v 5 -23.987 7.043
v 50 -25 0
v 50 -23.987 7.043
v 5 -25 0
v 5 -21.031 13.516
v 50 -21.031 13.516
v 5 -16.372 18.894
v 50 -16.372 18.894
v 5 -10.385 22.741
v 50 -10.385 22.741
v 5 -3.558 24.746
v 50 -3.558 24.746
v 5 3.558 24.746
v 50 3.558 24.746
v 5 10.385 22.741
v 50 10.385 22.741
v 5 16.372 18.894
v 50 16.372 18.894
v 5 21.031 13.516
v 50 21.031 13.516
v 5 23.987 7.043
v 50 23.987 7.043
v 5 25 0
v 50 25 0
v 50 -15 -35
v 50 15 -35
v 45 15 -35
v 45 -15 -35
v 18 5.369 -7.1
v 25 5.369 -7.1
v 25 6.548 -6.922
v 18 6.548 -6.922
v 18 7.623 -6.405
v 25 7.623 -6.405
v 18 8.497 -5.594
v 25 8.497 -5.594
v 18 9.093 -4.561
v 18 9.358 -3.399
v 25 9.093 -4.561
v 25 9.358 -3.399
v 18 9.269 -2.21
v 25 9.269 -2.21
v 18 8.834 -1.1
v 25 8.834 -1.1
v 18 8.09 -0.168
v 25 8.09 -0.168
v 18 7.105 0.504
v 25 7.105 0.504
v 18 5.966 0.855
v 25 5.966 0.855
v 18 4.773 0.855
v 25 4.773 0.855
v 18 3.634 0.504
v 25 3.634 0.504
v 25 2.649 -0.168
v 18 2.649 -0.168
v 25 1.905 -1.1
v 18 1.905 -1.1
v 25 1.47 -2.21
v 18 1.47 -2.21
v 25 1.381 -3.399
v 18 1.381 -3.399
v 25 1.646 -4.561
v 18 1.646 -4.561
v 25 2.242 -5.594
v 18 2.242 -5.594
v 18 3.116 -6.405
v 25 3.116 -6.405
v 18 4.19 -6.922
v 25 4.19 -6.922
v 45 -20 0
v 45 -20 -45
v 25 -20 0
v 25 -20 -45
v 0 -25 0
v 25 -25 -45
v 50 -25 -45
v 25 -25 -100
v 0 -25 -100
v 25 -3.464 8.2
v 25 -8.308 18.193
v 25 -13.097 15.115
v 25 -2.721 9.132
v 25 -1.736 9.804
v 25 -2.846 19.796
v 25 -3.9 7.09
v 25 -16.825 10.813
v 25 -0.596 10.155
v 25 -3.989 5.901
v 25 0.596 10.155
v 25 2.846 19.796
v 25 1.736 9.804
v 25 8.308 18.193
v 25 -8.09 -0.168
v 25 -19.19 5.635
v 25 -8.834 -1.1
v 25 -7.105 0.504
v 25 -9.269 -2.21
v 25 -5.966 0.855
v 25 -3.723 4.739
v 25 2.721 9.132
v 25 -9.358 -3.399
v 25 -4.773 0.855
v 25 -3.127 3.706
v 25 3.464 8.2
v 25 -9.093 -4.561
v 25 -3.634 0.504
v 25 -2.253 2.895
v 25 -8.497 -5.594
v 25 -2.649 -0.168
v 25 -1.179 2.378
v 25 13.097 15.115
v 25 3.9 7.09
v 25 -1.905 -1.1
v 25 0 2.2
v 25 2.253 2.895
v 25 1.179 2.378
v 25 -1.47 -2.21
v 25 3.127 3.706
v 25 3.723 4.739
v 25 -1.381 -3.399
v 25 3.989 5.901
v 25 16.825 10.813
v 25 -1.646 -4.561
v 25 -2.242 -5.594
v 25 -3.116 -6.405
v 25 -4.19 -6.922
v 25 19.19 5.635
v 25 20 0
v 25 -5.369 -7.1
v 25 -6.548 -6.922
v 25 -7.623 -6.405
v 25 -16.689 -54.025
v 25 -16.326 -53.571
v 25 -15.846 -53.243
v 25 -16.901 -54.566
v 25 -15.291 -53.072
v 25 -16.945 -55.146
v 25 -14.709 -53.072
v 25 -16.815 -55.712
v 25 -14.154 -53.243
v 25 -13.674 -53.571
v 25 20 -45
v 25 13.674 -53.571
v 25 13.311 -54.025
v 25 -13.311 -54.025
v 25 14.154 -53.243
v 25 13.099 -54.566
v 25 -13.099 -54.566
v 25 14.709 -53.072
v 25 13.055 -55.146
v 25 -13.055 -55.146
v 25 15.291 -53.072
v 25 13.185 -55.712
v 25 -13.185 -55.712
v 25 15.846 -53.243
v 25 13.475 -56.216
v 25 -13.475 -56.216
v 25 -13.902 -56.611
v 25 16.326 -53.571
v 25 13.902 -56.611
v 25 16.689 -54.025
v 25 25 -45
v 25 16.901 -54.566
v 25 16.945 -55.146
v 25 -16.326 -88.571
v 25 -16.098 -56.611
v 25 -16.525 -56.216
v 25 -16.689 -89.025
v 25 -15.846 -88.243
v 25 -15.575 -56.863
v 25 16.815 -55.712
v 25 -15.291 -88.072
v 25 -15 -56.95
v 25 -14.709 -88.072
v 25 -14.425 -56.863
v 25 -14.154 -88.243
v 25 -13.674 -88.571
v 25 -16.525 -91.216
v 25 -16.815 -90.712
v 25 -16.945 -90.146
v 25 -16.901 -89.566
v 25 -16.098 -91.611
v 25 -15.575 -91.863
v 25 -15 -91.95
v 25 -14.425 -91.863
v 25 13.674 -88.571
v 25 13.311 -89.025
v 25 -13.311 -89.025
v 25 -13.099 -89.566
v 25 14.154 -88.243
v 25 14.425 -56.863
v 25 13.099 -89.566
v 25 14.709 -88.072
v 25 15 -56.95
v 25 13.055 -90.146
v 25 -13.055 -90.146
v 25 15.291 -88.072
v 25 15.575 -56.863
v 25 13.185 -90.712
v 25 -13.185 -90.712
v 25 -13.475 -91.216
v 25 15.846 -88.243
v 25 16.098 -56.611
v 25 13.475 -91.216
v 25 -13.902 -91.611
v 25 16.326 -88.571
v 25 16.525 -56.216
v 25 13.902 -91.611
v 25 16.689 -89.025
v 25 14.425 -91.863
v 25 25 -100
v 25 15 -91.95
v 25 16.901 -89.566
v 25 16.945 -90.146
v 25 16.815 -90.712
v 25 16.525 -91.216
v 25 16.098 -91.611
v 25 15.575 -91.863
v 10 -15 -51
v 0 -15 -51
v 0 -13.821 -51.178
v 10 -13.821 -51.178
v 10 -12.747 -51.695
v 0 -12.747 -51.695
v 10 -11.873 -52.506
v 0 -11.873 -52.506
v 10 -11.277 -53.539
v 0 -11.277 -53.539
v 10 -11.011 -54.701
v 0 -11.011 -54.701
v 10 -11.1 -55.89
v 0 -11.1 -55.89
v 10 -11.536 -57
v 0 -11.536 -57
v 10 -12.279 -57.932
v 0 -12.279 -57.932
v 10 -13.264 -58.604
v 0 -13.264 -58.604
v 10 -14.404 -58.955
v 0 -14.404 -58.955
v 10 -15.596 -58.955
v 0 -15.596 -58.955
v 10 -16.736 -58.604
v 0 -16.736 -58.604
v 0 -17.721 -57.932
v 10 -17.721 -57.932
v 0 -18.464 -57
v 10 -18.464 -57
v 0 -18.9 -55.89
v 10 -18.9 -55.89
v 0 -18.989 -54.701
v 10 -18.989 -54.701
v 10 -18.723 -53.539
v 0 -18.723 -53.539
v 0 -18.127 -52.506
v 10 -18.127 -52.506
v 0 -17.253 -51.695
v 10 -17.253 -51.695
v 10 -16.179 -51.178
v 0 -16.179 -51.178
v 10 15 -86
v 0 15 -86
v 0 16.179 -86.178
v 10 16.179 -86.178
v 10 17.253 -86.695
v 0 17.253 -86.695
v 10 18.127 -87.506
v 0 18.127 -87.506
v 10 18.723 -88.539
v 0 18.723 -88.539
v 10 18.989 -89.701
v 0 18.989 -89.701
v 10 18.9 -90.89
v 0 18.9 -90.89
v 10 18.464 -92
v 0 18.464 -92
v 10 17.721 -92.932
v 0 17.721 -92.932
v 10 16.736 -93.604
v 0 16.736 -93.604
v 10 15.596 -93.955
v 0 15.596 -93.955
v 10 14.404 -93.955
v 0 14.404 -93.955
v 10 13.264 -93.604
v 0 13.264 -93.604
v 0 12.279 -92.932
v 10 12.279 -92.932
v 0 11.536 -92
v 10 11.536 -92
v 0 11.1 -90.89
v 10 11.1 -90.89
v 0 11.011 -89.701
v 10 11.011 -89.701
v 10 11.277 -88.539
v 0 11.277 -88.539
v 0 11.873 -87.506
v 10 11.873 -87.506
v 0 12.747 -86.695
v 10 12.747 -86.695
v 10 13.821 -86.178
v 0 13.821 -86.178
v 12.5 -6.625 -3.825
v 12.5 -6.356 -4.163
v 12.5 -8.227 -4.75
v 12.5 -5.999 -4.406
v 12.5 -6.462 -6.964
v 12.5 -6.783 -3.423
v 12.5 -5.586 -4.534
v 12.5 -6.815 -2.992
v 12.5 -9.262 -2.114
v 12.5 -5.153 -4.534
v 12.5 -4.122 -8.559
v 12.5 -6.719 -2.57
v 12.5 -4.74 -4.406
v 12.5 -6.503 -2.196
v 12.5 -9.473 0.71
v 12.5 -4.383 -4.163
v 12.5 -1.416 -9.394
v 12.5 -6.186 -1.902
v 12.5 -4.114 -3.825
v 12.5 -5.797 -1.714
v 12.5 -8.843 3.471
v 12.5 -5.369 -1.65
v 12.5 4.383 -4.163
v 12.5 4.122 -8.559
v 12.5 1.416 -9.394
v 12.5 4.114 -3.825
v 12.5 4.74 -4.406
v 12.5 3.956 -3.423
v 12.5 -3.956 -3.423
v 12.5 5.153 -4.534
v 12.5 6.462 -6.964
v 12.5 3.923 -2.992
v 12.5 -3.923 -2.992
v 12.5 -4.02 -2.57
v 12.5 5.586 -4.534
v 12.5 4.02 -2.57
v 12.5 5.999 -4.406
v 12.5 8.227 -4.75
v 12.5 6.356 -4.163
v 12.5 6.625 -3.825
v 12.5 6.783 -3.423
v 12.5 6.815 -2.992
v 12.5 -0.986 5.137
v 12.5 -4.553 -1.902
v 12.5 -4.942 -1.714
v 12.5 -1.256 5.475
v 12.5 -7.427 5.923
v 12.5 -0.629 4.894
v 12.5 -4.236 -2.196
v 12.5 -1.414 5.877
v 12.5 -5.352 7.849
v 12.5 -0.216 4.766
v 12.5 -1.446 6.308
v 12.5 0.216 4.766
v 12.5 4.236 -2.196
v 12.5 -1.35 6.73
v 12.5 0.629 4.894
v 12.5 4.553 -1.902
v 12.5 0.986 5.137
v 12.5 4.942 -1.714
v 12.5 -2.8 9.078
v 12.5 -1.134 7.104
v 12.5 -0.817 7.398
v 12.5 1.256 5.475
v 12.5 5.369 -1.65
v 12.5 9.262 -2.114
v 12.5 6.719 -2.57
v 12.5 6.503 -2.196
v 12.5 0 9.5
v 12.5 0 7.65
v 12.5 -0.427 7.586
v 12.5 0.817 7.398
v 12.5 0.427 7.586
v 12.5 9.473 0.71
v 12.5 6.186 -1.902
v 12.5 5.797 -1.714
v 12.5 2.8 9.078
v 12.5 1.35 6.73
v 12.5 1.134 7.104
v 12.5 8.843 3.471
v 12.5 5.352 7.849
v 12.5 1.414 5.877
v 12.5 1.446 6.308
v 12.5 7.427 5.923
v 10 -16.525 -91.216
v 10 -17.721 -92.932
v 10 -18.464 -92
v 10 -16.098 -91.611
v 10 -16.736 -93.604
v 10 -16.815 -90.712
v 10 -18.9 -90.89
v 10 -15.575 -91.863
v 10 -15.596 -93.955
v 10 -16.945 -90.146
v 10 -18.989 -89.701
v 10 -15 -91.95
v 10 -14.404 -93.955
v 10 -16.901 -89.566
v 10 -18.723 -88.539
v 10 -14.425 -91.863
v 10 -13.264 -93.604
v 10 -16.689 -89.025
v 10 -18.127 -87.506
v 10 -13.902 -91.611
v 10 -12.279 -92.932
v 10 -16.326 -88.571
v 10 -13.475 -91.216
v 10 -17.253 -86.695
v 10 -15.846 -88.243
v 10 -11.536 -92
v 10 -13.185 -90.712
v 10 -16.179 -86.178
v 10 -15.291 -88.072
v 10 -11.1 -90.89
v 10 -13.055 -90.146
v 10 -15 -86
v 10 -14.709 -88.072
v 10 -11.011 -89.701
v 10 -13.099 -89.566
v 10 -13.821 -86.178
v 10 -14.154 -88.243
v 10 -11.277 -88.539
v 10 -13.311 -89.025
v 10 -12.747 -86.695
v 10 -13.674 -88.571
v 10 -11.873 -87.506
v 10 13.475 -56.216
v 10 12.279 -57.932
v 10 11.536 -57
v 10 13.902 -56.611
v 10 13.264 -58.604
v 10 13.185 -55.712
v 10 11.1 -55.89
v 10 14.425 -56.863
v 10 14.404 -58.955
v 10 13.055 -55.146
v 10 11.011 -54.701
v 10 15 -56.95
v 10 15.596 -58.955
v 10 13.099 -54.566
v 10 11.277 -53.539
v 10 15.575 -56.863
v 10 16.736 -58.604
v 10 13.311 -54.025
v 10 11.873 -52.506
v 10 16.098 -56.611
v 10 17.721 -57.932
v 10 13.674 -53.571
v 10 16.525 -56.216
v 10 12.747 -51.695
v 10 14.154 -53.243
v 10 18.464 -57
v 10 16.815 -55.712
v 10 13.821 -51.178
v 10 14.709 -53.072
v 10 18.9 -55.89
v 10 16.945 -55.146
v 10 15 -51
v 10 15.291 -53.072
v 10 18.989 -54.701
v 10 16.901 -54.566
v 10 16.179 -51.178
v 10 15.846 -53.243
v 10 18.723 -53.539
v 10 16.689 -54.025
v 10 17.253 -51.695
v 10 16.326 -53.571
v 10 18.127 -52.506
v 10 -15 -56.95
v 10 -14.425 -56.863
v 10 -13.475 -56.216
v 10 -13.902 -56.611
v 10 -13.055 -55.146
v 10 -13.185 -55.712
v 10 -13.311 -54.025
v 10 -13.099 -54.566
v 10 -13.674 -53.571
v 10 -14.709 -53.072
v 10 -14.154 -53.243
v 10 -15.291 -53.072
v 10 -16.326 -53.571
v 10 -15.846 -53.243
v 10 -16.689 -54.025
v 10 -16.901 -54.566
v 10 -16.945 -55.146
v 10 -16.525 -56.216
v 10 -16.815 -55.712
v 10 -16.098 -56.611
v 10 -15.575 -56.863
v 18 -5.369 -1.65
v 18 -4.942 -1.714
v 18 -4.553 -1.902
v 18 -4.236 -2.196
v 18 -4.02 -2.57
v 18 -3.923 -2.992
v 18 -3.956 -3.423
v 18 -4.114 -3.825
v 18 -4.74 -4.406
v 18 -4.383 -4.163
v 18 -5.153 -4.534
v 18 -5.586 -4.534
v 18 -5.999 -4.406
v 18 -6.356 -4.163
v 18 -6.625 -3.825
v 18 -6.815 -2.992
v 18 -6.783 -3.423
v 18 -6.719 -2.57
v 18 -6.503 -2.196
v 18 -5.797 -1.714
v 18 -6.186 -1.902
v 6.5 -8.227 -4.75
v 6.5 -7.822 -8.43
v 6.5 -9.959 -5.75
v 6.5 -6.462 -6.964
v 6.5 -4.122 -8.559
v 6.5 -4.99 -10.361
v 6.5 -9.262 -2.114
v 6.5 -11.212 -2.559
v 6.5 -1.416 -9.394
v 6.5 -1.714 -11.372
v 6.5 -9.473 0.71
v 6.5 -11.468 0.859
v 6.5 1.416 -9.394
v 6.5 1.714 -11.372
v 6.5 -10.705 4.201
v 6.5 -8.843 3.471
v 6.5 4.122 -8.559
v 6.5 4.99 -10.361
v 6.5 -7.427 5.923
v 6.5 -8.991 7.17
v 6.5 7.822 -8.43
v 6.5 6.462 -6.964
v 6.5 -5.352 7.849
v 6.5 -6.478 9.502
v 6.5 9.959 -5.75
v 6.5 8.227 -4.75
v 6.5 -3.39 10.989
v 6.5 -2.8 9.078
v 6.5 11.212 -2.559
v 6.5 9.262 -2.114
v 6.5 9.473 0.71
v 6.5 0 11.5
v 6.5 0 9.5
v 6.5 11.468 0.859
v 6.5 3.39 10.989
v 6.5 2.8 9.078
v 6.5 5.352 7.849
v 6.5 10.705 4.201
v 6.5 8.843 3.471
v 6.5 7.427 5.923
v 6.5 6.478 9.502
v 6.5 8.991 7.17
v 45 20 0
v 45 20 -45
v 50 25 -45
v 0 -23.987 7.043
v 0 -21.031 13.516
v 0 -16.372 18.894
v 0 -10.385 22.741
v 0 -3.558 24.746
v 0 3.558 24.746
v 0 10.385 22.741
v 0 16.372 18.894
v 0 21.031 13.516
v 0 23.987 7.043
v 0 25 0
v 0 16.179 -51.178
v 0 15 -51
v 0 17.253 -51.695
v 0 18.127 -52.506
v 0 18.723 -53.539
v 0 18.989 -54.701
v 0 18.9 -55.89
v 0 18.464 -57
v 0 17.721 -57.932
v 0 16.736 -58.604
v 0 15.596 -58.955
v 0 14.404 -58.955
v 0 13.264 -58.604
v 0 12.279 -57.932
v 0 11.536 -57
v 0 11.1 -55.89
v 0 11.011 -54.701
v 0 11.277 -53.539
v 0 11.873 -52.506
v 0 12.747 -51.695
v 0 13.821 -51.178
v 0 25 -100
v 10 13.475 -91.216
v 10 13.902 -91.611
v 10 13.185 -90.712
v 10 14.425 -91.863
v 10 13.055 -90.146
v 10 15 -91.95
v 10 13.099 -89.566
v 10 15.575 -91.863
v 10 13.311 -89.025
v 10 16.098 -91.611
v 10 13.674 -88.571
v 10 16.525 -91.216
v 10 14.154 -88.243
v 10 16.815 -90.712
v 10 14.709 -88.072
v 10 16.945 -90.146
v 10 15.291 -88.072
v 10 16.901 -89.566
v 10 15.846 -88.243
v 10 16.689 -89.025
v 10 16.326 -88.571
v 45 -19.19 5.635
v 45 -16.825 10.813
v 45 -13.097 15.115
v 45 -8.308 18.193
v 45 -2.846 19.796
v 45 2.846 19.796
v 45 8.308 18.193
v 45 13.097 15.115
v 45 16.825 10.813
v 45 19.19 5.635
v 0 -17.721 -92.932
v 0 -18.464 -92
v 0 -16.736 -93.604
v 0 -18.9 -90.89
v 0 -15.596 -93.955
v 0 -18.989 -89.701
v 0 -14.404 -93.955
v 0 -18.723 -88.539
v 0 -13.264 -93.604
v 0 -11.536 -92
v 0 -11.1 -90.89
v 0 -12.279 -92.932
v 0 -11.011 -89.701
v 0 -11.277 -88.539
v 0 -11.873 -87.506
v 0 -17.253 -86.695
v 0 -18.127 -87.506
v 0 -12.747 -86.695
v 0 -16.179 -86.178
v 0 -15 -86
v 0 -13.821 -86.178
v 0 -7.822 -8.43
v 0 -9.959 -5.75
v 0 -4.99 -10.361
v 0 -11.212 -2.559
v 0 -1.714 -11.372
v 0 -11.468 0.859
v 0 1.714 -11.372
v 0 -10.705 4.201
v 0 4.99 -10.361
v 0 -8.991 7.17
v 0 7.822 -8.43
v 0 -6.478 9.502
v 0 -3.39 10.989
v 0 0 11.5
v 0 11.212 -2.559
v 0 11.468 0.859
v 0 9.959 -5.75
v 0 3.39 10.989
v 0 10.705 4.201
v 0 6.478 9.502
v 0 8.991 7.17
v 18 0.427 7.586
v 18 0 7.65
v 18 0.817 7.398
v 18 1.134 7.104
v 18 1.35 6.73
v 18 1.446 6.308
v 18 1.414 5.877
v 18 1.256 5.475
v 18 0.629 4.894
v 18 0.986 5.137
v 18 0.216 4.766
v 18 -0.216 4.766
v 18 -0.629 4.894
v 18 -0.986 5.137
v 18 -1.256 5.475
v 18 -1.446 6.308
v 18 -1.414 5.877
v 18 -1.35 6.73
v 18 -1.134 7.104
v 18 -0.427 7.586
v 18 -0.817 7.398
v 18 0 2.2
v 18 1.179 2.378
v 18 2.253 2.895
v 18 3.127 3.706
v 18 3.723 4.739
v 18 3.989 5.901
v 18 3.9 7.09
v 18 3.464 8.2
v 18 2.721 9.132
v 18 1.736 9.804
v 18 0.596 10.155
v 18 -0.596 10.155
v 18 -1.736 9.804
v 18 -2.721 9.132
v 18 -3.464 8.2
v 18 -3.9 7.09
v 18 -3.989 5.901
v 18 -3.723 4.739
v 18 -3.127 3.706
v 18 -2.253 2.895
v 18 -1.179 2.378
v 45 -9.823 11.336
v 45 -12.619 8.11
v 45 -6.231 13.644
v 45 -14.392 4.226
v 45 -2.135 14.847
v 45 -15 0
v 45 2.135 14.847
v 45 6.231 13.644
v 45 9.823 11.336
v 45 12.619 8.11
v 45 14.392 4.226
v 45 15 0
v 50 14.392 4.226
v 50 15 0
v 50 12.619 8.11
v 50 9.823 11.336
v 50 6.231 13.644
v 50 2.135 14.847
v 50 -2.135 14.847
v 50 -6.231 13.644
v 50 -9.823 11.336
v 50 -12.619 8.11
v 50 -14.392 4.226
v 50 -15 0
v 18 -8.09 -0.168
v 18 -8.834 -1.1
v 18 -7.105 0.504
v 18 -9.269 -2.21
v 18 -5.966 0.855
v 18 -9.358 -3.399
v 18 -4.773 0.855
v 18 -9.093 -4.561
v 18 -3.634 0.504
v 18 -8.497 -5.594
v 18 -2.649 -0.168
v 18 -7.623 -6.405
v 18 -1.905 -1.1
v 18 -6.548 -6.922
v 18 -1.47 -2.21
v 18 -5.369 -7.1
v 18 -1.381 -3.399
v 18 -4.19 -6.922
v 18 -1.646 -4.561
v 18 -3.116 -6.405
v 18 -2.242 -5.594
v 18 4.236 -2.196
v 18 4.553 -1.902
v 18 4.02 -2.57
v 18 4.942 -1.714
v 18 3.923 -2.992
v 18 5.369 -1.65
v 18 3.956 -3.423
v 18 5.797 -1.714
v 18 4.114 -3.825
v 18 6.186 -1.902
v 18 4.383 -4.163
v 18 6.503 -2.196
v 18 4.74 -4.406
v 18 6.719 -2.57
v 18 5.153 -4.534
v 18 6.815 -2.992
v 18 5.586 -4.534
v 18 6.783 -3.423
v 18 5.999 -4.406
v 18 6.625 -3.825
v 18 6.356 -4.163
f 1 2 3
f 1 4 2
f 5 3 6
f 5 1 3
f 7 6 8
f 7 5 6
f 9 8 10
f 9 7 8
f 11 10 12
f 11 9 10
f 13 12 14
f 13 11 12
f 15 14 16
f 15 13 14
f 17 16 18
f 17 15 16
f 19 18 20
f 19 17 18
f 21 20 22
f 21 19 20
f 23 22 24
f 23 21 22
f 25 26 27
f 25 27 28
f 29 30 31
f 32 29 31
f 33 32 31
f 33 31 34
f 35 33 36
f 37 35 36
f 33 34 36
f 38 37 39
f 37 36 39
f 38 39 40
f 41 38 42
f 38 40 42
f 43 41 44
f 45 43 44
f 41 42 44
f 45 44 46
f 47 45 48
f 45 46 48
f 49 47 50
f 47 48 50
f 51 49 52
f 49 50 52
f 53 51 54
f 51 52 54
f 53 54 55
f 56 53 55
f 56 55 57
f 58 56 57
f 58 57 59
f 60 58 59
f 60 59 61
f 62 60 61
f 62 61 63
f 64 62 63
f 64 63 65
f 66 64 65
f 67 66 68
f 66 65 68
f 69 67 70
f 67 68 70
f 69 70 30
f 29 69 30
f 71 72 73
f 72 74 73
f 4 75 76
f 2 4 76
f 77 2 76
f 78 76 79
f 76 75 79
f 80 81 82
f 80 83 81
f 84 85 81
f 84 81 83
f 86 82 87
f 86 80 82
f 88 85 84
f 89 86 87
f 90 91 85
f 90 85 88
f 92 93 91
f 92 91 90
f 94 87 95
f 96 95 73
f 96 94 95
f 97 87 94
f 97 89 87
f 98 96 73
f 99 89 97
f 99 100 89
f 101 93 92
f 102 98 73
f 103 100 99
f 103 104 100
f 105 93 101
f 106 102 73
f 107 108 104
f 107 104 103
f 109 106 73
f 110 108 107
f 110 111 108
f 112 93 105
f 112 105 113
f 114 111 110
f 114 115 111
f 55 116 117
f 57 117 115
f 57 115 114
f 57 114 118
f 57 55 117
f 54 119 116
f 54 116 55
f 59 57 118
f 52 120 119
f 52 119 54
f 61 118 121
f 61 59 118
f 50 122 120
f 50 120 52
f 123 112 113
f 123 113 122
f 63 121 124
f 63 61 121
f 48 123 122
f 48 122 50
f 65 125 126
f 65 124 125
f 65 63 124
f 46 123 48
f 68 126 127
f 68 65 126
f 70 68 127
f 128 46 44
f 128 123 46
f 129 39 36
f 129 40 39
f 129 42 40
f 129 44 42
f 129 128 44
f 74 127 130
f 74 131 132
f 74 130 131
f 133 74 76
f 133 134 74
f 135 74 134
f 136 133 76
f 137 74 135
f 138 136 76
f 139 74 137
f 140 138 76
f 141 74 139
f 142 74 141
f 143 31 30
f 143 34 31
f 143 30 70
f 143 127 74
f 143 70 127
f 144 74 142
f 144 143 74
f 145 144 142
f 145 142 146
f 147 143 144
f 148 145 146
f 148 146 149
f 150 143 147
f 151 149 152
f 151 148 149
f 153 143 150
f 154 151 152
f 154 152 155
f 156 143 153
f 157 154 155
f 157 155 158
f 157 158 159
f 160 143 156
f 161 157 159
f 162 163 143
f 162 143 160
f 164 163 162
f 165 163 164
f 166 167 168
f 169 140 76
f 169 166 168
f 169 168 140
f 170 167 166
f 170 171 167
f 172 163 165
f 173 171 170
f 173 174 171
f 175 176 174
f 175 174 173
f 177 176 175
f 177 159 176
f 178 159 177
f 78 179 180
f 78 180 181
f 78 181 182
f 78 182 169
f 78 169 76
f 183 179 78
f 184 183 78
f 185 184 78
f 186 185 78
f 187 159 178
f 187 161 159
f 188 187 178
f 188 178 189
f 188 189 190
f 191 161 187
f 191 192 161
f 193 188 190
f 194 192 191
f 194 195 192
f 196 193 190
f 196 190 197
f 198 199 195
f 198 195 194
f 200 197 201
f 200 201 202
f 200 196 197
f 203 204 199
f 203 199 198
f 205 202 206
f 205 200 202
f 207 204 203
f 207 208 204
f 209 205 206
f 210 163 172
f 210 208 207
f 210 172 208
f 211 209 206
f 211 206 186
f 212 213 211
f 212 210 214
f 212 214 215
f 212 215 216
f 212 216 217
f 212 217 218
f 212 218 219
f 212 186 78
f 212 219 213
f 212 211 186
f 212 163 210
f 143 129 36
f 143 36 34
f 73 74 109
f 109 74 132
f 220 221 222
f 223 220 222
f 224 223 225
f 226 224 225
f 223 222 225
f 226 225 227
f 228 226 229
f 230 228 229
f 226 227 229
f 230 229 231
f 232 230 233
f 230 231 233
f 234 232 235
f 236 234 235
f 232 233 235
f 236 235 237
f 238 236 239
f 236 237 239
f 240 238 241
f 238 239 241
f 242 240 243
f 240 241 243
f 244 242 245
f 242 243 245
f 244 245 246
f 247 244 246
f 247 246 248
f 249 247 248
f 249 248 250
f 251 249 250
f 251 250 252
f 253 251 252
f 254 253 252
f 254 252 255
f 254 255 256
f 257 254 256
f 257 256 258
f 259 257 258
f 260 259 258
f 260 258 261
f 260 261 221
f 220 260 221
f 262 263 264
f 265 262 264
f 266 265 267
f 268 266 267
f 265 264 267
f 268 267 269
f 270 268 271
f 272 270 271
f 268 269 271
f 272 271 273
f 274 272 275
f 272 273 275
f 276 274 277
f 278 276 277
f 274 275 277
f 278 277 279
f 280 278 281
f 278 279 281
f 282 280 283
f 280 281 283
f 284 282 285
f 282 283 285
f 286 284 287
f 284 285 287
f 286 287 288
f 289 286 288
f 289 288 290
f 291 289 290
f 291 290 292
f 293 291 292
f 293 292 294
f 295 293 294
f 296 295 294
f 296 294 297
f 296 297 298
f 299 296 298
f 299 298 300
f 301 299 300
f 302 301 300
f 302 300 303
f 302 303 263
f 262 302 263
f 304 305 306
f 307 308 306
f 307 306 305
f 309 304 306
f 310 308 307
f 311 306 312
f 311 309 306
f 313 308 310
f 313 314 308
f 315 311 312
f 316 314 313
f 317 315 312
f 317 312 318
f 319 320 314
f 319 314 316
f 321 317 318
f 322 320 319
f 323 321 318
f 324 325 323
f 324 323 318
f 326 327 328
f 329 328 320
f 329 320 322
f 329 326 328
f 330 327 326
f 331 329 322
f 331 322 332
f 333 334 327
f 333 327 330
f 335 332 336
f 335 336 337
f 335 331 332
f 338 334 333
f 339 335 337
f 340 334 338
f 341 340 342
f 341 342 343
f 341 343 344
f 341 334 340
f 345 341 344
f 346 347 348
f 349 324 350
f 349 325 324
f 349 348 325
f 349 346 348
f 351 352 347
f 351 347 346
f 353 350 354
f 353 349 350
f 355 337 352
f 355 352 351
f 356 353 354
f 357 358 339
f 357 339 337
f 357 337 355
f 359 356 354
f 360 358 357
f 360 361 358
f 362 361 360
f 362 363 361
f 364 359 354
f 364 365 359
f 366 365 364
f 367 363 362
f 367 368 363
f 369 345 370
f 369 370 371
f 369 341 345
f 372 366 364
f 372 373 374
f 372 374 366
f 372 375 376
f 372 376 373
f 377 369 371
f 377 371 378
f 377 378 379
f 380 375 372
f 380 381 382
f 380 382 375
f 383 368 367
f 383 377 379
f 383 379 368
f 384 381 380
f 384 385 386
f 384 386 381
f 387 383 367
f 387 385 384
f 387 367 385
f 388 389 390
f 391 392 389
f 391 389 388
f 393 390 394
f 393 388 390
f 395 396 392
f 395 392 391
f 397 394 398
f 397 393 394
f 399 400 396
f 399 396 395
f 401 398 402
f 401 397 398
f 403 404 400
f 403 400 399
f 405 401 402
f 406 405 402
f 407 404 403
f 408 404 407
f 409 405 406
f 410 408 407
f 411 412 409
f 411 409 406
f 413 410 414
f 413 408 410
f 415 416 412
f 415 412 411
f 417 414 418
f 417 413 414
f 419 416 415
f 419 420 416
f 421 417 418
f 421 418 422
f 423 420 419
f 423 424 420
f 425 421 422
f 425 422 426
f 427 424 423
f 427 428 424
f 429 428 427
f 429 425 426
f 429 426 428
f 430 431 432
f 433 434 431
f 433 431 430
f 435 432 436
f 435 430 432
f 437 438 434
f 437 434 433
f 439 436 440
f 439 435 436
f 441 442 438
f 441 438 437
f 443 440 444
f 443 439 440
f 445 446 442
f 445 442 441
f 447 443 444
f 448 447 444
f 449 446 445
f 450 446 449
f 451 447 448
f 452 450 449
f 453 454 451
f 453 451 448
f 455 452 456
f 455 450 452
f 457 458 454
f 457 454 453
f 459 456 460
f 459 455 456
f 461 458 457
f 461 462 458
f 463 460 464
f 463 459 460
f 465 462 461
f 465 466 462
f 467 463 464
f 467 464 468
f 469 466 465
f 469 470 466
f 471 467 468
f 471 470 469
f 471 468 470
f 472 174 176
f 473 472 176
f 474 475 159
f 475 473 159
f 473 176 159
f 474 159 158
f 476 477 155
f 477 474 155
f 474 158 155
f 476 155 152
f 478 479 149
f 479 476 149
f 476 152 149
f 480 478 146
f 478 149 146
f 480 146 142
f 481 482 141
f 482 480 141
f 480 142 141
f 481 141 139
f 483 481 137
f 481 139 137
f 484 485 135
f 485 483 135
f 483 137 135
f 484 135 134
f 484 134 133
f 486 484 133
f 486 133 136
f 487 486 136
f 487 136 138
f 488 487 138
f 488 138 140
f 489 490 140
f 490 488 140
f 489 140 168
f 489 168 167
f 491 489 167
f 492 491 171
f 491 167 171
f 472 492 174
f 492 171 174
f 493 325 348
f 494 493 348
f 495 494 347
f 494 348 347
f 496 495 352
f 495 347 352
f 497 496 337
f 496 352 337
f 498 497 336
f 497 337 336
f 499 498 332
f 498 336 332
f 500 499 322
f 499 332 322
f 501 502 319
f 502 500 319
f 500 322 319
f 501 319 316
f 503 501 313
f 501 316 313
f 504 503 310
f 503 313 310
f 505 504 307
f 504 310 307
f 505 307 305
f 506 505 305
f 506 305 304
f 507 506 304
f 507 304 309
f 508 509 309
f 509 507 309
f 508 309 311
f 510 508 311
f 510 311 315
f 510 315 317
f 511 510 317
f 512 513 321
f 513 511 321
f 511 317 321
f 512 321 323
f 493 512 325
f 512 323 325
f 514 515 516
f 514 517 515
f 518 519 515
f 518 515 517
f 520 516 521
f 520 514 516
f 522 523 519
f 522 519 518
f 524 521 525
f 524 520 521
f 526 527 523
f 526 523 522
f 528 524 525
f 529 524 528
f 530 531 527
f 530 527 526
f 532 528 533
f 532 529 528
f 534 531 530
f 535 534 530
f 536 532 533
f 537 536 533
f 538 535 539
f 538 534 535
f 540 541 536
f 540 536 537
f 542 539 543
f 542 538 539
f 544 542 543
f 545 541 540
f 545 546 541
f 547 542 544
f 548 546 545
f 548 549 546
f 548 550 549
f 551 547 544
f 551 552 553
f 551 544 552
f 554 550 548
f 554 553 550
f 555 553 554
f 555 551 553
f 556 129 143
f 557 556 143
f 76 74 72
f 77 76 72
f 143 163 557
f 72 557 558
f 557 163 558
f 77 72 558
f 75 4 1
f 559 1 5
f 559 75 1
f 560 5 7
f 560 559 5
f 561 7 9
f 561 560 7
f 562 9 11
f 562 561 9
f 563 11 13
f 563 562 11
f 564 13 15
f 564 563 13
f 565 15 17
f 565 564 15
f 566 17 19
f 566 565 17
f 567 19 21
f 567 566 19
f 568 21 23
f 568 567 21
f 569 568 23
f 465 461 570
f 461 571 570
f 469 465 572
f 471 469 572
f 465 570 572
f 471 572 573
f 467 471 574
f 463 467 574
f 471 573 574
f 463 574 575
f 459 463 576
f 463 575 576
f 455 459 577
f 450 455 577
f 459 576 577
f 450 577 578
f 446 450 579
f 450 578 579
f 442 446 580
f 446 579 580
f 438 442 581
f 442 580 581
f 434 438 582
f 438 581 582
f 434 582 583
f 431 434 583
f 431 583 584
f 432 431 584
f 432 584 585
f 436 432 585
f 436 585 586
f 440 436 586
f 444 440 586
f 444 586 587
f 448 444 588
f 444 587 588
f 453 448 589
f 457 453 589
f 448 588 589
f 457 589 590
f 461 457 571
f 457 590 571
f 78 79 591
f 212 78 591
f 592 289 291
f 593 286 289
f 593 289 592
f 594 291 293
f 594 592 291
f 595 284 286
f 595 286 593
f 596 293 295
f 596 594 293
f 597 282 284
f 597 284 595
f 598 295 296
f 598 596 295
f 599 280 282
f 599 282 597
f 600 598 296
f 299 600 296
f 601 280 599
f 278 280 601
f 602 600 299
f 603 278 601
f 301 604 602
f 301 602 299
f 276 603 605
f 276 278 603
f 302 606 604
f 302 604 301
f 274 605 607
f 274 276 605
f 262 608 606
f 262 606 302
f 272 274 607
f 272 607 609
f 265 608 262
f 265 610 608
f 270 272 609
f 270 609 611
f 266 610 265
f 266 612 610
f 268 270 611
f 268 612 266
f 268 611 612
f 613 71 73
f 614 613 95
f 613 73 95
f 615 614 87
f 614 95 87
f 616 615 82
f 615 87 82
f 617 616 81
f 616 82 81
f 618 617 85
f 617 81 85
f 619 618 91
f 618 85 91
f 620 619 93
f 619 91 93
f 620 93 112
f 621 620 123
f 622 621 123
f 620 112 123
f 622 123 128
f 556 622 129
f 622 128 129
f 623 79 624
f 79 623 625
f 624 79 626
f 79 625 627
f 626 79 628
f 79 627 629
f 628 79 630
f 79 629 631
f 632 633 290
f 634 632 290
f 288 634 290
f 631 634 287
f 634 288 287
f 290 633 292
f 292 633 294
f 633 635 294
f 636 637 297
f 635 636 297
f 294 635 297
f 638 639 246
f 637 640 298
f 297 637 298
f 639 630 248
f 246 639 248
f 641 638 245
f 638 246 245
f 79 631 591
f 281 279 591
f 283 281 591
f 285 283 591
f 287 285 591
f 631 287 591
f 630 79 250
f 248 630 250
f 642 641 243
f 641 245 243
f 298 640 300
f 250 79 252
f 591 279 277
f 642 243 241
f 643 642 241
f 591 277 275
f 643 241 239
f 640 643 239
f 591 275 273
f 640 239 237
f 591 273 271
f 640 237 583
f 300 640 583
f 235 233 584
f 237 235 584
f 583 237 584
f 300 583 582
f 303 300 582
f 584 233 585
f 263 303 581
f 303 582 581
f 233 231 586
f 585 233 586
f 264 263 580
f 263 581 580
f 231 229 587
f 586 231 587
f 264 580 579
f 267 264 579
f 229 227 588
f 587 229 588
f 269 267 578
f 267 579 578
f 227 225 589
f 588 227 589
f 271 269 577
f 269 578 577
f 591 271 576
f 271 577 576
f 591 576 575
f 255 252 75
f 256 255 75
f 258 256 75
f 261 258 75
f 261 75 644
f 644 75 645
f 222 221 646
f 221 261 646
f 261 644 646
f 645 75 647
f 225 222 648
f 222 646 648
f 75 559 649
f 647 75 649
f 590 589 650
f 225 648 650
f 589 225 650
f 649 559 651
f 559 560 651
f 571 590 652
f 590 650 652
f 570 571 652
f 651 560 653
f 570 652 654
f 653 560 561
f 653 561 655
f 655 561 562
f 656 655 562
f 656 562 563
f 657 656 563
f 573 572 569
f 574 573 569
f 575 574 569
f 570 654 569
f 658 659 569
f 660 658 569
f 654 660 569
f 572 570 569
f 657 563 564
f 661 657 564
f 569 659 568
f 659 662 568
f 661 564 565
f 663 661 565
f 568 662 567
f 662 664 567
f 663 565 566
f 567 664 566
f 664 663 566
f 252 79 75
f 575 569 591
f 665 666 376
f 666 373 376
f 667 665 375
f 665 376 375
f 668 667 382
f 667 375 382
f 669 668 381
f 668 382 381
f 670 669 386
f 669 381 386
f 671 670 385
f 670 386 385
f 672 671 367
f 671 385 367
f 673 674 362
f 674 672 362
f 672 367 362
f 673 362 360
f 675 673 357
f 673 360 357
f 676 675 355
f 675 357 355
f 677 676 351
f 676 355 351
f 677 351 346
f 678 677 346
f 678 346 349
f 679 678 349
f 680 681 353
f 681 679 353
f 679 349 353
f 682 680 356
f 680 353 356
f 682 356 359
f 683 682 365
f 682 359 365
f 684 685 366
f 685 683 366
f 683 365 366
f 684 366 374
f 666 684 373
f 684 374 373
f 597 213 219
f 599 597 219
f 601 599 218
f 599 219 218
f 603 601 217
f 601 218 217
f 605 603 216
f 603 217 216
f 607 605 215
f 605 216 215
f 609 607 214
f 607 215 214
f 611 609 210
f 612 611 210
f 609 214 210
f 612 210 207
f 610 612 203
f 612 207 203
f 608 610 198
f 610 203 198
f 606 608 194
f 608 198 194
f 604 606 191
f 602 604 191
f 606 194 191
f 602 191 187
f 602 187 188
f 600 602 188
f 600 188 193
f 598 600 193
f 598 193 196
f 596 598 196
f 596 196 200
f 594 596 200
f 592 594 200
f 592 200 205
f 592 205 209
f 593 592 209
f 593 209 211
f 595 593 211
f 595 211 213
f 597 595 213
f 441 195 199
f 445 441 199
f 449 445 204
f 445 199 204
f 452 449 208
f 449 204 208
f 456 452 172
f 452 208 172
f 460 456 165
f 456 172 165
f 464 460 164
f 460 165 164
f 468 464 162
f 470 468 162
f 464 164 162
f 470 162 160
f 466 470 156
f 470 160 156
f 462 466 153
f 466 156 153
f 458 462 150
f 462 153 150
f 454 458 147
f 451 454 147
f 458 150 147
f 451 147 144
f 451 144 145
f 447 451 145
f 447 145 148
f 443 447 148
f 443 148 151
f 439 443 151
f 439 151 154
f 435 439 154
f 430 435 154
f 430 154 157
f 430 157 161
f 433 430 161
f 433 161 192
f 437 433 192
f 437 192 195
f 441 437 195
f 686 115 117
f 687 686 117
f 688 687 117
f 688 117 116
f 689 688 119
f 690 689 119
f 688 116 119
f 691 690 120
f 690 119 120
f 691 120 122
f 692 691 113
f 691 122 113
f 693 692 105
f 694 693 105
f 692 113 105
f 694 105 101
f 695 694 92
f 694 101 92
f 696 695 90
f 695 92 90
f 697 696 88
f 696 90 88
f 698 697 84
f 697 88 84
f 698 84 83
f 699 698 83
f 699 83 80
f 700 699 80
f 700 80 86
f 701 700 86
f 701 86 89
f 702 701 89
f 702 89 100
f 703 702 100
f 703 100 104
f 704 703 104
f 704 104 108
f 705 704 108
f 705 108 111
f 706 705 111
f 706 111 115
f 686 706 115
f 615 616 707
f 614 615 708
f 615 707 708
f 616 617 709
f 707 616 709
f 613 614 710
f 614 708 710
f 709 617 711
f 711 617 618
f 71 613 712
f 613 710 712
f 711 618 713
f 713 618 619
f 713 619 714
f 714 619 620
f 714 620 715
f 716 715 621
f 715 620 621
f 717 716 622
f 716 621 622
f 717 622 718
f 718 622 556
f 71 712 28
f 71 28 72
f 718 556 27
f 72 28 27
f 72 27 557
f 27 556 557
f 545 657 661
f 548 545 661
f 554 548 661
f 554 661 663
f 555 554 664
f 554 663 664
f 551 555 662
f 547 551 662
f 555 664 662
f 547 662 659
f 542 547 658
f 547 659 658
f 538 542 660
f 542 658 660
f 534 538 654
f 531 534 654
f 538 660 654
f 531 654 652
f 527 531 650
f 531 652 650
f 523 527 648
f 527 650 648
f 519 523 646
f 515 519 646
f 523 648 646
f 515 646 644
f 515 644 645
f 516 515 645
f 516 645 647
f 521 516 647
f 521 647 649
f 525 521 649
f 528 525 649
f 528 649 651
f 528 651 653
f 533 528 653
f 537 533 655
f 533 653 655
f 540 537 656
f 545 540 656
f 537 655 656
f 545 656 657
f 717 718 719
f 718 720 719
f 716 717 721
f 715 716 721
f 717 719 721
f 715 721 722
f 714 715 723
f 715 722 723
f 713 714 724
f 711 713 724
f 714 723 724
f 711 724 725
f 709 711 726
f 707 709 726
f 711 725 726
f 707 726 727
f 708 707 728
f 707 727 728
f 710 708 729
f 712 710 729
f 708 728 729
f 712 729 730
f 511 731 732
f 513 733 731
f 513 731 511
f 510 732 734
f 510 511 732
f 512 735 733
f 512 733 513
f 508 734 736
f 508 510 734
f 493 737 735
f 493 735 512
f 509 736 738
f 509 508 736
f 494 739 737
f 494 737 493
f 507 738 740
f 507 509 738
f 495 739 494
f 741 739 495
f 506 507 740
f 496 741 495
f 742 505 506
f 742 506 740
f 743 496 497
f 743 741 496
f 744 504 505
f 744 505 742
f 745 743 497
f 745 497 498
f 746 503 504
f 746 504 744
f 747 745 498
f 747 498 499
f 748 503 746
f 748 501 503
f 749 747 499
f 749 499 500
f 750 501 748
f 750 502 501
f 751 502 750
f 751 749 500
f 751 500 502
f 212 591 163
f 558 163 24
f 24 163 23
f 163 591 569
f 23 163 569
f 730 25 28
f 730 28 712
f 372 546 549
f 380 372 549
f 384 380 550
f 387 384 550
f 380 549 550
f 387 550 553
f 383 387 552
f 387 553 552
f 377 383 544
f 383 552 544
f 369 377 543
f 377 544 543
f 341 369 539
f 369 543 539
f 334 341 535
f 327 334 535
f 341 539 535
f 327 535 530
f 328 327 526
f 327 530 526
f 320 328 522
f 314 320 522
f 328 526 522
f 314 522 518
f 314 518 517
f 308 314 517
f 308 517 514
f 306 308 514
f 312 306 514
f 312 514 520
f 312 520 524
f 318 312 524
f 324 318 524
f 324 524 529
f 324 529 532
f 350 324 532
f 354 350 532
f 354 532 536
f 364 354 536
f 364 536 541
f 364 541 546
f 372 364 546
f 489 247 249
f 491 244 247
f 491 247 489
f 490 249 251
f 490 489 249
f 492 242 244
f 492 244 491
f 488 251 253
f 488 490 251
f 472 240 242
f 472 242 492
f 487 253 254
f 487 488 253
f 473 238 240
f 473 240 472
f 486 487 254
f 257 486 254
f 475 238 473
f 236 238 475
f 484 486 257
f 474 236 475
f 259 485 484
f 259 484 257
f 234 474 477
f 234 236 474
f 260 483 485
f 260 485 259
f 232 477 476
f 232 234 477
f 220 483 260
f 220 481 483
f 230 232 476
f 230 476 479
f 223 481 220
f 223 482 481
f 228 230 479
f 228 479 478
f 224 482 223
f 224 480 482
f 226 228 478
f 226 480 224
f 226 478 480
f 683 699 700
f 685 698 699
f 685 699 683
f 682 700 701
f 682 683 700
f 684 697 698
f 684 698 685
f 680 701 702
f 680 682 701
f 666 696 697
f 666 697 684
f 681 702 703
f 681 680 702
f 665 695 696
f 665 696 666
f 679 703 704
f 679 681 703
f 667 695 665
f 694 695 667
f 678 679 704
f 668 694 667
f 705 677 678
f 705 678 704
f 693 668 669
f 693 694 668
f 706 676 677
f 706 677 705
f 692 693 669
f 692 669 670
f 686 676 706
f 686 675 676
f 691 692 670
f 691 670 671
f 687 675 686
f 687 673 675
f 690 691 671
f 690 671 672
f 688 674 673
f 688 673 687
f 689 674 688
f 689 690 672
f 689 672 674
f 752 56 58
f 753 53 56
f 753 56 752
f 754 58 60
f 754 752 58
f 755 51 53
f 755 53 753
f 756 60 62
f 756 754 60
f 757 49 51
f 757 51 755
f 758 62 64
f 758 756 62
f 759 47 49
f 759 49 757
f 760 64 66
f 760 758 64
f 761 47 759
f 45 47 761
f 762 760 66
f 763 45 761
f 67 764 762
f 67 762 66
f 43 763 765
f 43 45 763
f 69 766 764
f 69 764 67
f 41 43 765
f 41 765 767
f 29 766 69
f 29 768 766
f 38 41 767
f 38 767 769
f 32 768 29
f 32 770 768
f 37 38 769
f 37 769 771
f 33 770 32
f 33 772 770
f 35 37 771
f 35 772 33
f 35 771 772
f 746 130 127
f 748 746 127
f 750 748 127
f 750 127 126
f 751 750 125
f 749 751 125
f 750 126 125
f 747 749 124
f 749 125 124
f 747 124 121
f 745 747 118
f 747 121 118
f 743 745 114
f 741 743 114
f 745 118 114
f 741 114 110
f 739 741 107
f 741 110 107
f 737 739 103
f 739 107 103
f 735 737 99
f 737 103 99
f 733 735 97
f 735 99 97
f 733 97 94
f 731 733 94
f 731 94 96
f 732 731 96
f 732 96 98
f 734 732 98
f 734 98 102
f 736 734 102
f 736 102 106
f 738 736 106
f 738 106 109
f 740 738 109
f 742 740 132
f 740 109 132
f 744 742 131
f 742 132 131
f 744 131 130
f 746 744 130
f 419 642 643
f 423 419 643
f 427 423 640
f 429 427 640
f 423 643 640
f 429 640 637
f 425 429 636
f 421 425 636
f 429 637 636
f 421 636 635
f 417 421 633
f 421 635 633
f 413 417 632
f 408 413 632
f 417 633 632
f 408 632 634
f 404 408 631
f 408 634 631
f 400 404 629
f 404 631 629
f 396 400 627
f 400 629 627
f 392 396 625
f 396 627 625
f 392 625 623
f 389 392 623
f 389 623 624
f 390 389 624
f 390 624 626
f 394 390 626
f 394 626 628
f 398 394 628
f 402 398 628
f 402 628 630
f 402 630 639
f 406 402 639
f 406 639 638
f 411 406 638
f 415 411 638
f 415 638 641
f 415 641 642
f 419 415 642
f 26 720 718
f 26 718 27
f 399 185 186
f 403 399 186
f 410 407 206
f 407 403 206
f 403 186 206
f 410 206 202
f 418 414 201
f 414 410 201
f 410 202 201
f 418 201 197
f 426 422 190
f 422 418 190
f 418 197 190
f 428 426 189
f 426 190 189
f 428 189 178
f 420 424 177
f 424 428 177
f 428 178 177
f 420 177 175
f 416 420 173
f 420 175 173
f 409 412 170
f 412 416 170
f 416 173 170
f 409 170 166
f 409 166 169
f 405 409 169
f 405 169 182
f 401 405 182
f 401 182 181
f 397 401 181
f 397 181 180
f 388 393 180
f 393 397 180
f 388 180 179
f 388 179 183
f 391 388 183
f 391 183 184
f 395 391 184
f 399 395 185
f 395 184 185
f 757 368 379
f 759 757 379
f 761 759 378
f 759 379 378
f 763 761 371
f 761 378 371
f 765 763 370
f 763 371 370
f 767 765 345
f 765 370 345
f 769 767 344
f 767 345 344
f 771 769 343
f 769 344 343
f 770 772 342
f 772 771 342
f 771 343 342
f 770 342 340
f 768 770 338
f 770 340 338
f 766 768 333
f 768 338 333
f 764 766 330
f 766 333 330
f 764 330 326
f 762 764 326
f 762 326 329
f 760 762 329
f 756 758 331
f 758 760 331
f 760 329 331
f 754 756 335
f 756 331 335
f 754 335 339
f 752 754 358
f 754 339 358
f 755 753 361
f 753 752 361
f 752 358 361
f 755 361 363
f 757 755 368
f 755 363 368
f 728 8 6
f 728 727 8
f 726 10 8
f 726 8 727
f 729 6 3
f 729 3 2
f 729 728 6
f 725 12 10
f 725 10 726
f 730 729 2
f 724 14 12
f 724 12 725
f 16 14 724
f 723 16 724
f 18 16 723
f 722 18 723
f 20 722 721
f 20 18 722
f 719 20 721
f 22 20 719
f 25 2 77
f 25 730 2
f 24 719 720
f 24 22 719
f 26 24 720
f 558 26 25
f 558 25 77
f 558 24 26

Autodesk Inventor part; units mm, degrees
ref_plane "YZ Plane" through (0, 0, 0) normal (1, 0, 0) x (0, 1, 0)
ref_plane "XZ Plane" through (0, 0, 0) normal (0, 1, 0) x (-1, 0, 0)
ref_plane "XY Plane" through (0, 0, 0) normal (0, 0, 1) x (1, 0, 0)
sketch "Sketch1" plane through (0, 0, 0) normal (1, 0, 0) x (0, 1, 0)
  line L0 (25, 22.5) -> (-25, 22.5)
  line L1 (-25, 22.5) -> (-25, -100)
  line L2 (-25, -100) -> (25, -100)
  line L3 (25, -100) -> (25, 22.5)
  circle A0 centre (0, 0) radius 25
  circle A1 centre (0, 0) radius 20
  circle A2 centre (0, 0) radius 3.2936
  point P0 (25, 0)
  point P1 (-25, 0)
  dimension "d0" = 50
  dimension "d1" = 122.5
  dimension "d2" = 25
  dimension "d3" = 22.5
  dimension "d12" = 40
  dimension "d13" = 6.5872
extrude "Extrusion1" add sketch "Sketch1" along normal blind 5 contours A0 L0 | L0 A0 | L3 L2 L1 A0 | A1
sketch "Sketch4" plane through (5, 0, 0) normal (1, 0, 0) x (0, 0, -1)
  line L0 (100, -25) -> (100, 25) projected
  line L1 (100, 25) -> (0, 25) projected
  line L2 (100, -25) -> (0, -25)
  line L3 (0, -25) -> (0, 25)
  line L4 (0, 25) -> (100, 25)
  line L5 (100, 25) -> (100, -25)
  circle A0 centre (0, 0) radius 3.2936 projected
  arc A1 (15, 20) -> (15, -20) centre (0, 0) ccw
  circle A2 centre (0, 0) radius 20
  line L6 (0, 20) -> (95, 20)
  line L7 (95, 20) -> (95, -20)
  line L8 (95, -20) -> (0, -20)
  line L9 (0, -20) -> (0, 20)
  point P0 (0, -20)
  dimension "d15" = 40
  dimension "d14" = 50
  dimension "d16" = 5
  dimension "d17" = 5
extrude "Extrusion3" add sketch "Sketch4" along normal blind 45 contours L2 A1 L8 L7 L6 L1 L0 | A1 L3 A2 | L3 L8 A1 | A1 L6 L3
sketch "Sketch5" plane through (50, 0, 0) normal (1, 0, 0) x (0, 0, -1)
  line L0 (100, -25) -> (100, 25) projected
  line L1 (0, 25) -> (100, 25)
  line L2 (100, 25) -> (100, -25)
  line L3 (100, -25) -> (0, -25)
  line L4 (0, -25) -> (0, 25)
  circle A0 centre (0, 0) radius 25
  arc A1 (0, 20) -> (0, -20) centre (0, 0) ccw projected
  circle A2 centre (0, 0) radius 15
  line L5 (0, 15) -> (35, 15)
  line L6 (35, 15) -> (35, -15)
  line L7 (35, -15) -> (0, -15)
  line L8 (0, -15) -> (0, 15)
  point P0 (0, -15)
  point P1 (100, 25)
  dimension "d20" = 30
  dimension "d21" = 10
  dimension "d22" = 50
  dimension "d23" = 35
extrude "Extrusion4" add sketch "Sketch5" against normal blind 5 contours L3 A0 L7 L6 L5 L1 L0 | A0 L4 A1 | L4 L7 A0 | A0 L5 L4 | A1 L4 A2
sketch "Sketch6" plane through (5, 0, 0) normal (1, 0, 0) x (0, 0, -1)
  circle A0 centre (0, 0) radius 20
  line L0 (95, 20) -> (0, 20) projected
  line L1 (0, -20) -> (95, -20) projected
  line L2 (0, 20) -> (22, 20)
  line L3 (22, 20) -> (22, -20)
  line L4 (22, -20) -> (0, -20)
  line L5 (0, -20) -> (0, 20)
  dimension "d26" = 22
extrude "Extrusion5" add sketch "Sketch6" along normal blind 20
sketch "Sketch7" plane through (0, 0, 0) normal (-1, 0, 0) x (0, 0, 1)
  circle A0 centre (0, 0) radius 9.5
  dimension "d29" = 19
extrude "Extrusion6" cut sketch "Sketch7" against normal blind 12.5
sketch "Sketch8" plane through (0, 0, 0) normal (-1, 0, 0) x (0, 0, 1)
  circle A0 centre (0, 0) radius 11.5
  dimension "d32" = 23
extrude "Extrusion7" cut sketch "Sketch8" against normal blind 6.5
sketch "Sketch9" plane through (12.5, 0, 0) normal (-1, 0, 0) x (0, 0, 1)
  circle A0 centre (0, 0) radius 9.5 projected
  circle A1 centre (0, 0) radius 6.2
  line L0 (0, 0) -> (7.2952, 0)
  line L1 (0, 0) -> (-3.8354, 6.643)
  line L2 (0, 0) -> (-3.5239, -6.1036)
  circle A2 centre (-3.1, 5.3694) radius 1.45
  circle A3 centre (6.2, 0) radius 1.45
  circle A4 centre (-3.1, -5.3694) radius 1.45
  dimension "d35" = 12.4
  dimension "d36" = 120
  dimension "d37" = 120
  dimension "d38" = 2.9
  dimension "d39" = 2.9
  dimension "d40" = 2.9
extrude "Extrusion8" cut sketch "Sketch9" against normal blind 16 contours L0 A3 A1 | A1 A3 | A1 A3 L0 | A2 L1 A1 | A1 L1 A2 | A4 A1 | A1 L2 A4 | L1 A2 A1 | A1 A2 L1 | A1 A4 L2
sketch "Sketch10" plane through (25, 0, 0) normal (1, 0, 0) x (0, 0, -1)
  circle A0 centre (3.1, 5.3694) radius 1.45 projected
  circle A1 centre (3.1, 5.3694) radius 4
  circle A2 centre (3.1, -5.3694) radius 1.45 projected
  circle A3 centre (3.1, -5.3694) radius 4
  circle A4 centre (-6.2, 0) radius 1.45 projected
  circle A5 centre (-6.2, 0) radius 4
  point P0 (0, 0)
  dimension "d43" = 8
  dimension "d44" = 8
  dimension "d45" = 8
extrude "Extrusion9" cut sketch "Sketch10" against normal blind 7
sketch "Sketch11" plane through (0, 25, 0) normal (0, 1, 0) x (1, 0, 0)
  line L0 (0, 100) -> (50, 100) projected
  line L1 (0, 100) -> (0, 0) projected
  line L2 (50, 100) -> (0, 100)
  line L3 (0, 100) -> (0, 45)
  line L4 (0, 45) -> (50, 45)
  line L5 (50, 45) -> (50, 100)
  line L6 (50, 0) -> (50, 100) projected
  line L7 (50, 100) -> (25, 100)
  line L8 (25, 100) -> (25, 45)
  line L9 (25, 45) -> (50, 45)
  line L10 (50, 45) -> (50, 100)
  dimension "d48" = 55
extrude "Extrusion10" cut sketch "Sketch11" against normal blind 50 contours L0 L5 L4 L8
sketch "Sketch12" plane through (5, 0, 0) normal (1, 0, 0) x (0, 0, -1)
  line L0 (95, 20) -> (22, 20) projected
  line L1 (22, -20) -> (95, -20) projected
  line L2 (95, 20) -> (45, 20)
  line L3 (45, 20) -> (45, -20)
  line L4 (45, -20) -> (95, -20)
  line L5 (95, -20) -> (95, 20)
  point P0 (0, 0)
  dimension "d51" = 50
extrude "Extrusion11" add sketch "Sketch12" along normal blind 20
sketch "Sketch13" plane through (25, 25, -45) normal (1, 0, 0) x (0, 0, -1)
  line L0 (10, -10) -> (45, -10)
  line L1 (45, -10) -> (45, -40)
  line L2 (45, -40) -> (10, -40)
  line L3 (10, -40) -> (10, -10)
  line L4 (0, 0) -> (55, 0) projected
  line L5 (55, 0) -> (55, -50) projected
  line L6 (55, -50) -> (0, -50) projected
  line L7 (0, -50) -> (0, 0) projected
  circle A0 centre (10, -10) radius 1.95
  circle A1 centre (10, -40) radius 1.95
  circle A2 centre (45, -40) radius 1.95
  circle A3 centre (45, -10) radius 1.95
  point P0 (-45, -25)
  dimension "d54" = 10
  dimension "d55" = 10
  dimension "d56" = 10
  dimension "d57" = 10
  dimension "d58" = 3.9
  dimension "d59" = 3.9
  dimension "d60" = 3.9
  dimension "d61" = 3.9
extrude "Extrusion12" cut sketch "Sketch13" against normal blind 26 contours L3 A0 L0 | L0 A0 L3 | A3 L1 L0 | L0 L1 A3 | A1 L2 L3 | L3 L2 A1 | A2 L2 L1 | L1 L2 A2
sketch "Sketch14" plane through (0, 0, 0) normal (-1, 0, 0) x (0, 0, 1)
  circle A0 centre (-90, 15) radius 1.95 projected
  circle A1 centre (-90, 15) radius 4
  circle A2 centre (-55, 15) radius 1.95 projected
  circle A3 centre (-55, 15) radius 4
  circle A4 centre (-55, -15) radius 1.95 projected
  circle A5 centre (-55, -15) radius 4
  circle A6 centre (-90, -15) radius 1.95 projected
  circle A7 centre (-90, -15) radius 4
  point P0 (0, 0)
  dimension "d64" = 8
  dimension "d65" = 8
  dimension "d66" = 8
  dimension "d67" = 8
extrude "Extrusion13" cut sketch "Sketch14" against normal blind 10 contours A0 | A1 | A2 | A3 | A5 | A7
sketch "Sketch15" plane through (5, 0, 0) normal (1, 0, 0) x (0, 0, -1)
  line L0 (45, -20) -> (45, 20) projected
  line L1 (22, -20) -> (45, -20) projected
  line L2 (45, 20) -> (22, 20)
  line L3 (22, 20) -> (22, -20)
  line L4 (22, -20) -> (45, -20)
  line L5 (45, -20) -> (45, 20)
  point P0 (0, 0)
extrude "Extrusion14" add sketch "Sketch15" along normal blind 20
properties part number "Link2_v2a"
